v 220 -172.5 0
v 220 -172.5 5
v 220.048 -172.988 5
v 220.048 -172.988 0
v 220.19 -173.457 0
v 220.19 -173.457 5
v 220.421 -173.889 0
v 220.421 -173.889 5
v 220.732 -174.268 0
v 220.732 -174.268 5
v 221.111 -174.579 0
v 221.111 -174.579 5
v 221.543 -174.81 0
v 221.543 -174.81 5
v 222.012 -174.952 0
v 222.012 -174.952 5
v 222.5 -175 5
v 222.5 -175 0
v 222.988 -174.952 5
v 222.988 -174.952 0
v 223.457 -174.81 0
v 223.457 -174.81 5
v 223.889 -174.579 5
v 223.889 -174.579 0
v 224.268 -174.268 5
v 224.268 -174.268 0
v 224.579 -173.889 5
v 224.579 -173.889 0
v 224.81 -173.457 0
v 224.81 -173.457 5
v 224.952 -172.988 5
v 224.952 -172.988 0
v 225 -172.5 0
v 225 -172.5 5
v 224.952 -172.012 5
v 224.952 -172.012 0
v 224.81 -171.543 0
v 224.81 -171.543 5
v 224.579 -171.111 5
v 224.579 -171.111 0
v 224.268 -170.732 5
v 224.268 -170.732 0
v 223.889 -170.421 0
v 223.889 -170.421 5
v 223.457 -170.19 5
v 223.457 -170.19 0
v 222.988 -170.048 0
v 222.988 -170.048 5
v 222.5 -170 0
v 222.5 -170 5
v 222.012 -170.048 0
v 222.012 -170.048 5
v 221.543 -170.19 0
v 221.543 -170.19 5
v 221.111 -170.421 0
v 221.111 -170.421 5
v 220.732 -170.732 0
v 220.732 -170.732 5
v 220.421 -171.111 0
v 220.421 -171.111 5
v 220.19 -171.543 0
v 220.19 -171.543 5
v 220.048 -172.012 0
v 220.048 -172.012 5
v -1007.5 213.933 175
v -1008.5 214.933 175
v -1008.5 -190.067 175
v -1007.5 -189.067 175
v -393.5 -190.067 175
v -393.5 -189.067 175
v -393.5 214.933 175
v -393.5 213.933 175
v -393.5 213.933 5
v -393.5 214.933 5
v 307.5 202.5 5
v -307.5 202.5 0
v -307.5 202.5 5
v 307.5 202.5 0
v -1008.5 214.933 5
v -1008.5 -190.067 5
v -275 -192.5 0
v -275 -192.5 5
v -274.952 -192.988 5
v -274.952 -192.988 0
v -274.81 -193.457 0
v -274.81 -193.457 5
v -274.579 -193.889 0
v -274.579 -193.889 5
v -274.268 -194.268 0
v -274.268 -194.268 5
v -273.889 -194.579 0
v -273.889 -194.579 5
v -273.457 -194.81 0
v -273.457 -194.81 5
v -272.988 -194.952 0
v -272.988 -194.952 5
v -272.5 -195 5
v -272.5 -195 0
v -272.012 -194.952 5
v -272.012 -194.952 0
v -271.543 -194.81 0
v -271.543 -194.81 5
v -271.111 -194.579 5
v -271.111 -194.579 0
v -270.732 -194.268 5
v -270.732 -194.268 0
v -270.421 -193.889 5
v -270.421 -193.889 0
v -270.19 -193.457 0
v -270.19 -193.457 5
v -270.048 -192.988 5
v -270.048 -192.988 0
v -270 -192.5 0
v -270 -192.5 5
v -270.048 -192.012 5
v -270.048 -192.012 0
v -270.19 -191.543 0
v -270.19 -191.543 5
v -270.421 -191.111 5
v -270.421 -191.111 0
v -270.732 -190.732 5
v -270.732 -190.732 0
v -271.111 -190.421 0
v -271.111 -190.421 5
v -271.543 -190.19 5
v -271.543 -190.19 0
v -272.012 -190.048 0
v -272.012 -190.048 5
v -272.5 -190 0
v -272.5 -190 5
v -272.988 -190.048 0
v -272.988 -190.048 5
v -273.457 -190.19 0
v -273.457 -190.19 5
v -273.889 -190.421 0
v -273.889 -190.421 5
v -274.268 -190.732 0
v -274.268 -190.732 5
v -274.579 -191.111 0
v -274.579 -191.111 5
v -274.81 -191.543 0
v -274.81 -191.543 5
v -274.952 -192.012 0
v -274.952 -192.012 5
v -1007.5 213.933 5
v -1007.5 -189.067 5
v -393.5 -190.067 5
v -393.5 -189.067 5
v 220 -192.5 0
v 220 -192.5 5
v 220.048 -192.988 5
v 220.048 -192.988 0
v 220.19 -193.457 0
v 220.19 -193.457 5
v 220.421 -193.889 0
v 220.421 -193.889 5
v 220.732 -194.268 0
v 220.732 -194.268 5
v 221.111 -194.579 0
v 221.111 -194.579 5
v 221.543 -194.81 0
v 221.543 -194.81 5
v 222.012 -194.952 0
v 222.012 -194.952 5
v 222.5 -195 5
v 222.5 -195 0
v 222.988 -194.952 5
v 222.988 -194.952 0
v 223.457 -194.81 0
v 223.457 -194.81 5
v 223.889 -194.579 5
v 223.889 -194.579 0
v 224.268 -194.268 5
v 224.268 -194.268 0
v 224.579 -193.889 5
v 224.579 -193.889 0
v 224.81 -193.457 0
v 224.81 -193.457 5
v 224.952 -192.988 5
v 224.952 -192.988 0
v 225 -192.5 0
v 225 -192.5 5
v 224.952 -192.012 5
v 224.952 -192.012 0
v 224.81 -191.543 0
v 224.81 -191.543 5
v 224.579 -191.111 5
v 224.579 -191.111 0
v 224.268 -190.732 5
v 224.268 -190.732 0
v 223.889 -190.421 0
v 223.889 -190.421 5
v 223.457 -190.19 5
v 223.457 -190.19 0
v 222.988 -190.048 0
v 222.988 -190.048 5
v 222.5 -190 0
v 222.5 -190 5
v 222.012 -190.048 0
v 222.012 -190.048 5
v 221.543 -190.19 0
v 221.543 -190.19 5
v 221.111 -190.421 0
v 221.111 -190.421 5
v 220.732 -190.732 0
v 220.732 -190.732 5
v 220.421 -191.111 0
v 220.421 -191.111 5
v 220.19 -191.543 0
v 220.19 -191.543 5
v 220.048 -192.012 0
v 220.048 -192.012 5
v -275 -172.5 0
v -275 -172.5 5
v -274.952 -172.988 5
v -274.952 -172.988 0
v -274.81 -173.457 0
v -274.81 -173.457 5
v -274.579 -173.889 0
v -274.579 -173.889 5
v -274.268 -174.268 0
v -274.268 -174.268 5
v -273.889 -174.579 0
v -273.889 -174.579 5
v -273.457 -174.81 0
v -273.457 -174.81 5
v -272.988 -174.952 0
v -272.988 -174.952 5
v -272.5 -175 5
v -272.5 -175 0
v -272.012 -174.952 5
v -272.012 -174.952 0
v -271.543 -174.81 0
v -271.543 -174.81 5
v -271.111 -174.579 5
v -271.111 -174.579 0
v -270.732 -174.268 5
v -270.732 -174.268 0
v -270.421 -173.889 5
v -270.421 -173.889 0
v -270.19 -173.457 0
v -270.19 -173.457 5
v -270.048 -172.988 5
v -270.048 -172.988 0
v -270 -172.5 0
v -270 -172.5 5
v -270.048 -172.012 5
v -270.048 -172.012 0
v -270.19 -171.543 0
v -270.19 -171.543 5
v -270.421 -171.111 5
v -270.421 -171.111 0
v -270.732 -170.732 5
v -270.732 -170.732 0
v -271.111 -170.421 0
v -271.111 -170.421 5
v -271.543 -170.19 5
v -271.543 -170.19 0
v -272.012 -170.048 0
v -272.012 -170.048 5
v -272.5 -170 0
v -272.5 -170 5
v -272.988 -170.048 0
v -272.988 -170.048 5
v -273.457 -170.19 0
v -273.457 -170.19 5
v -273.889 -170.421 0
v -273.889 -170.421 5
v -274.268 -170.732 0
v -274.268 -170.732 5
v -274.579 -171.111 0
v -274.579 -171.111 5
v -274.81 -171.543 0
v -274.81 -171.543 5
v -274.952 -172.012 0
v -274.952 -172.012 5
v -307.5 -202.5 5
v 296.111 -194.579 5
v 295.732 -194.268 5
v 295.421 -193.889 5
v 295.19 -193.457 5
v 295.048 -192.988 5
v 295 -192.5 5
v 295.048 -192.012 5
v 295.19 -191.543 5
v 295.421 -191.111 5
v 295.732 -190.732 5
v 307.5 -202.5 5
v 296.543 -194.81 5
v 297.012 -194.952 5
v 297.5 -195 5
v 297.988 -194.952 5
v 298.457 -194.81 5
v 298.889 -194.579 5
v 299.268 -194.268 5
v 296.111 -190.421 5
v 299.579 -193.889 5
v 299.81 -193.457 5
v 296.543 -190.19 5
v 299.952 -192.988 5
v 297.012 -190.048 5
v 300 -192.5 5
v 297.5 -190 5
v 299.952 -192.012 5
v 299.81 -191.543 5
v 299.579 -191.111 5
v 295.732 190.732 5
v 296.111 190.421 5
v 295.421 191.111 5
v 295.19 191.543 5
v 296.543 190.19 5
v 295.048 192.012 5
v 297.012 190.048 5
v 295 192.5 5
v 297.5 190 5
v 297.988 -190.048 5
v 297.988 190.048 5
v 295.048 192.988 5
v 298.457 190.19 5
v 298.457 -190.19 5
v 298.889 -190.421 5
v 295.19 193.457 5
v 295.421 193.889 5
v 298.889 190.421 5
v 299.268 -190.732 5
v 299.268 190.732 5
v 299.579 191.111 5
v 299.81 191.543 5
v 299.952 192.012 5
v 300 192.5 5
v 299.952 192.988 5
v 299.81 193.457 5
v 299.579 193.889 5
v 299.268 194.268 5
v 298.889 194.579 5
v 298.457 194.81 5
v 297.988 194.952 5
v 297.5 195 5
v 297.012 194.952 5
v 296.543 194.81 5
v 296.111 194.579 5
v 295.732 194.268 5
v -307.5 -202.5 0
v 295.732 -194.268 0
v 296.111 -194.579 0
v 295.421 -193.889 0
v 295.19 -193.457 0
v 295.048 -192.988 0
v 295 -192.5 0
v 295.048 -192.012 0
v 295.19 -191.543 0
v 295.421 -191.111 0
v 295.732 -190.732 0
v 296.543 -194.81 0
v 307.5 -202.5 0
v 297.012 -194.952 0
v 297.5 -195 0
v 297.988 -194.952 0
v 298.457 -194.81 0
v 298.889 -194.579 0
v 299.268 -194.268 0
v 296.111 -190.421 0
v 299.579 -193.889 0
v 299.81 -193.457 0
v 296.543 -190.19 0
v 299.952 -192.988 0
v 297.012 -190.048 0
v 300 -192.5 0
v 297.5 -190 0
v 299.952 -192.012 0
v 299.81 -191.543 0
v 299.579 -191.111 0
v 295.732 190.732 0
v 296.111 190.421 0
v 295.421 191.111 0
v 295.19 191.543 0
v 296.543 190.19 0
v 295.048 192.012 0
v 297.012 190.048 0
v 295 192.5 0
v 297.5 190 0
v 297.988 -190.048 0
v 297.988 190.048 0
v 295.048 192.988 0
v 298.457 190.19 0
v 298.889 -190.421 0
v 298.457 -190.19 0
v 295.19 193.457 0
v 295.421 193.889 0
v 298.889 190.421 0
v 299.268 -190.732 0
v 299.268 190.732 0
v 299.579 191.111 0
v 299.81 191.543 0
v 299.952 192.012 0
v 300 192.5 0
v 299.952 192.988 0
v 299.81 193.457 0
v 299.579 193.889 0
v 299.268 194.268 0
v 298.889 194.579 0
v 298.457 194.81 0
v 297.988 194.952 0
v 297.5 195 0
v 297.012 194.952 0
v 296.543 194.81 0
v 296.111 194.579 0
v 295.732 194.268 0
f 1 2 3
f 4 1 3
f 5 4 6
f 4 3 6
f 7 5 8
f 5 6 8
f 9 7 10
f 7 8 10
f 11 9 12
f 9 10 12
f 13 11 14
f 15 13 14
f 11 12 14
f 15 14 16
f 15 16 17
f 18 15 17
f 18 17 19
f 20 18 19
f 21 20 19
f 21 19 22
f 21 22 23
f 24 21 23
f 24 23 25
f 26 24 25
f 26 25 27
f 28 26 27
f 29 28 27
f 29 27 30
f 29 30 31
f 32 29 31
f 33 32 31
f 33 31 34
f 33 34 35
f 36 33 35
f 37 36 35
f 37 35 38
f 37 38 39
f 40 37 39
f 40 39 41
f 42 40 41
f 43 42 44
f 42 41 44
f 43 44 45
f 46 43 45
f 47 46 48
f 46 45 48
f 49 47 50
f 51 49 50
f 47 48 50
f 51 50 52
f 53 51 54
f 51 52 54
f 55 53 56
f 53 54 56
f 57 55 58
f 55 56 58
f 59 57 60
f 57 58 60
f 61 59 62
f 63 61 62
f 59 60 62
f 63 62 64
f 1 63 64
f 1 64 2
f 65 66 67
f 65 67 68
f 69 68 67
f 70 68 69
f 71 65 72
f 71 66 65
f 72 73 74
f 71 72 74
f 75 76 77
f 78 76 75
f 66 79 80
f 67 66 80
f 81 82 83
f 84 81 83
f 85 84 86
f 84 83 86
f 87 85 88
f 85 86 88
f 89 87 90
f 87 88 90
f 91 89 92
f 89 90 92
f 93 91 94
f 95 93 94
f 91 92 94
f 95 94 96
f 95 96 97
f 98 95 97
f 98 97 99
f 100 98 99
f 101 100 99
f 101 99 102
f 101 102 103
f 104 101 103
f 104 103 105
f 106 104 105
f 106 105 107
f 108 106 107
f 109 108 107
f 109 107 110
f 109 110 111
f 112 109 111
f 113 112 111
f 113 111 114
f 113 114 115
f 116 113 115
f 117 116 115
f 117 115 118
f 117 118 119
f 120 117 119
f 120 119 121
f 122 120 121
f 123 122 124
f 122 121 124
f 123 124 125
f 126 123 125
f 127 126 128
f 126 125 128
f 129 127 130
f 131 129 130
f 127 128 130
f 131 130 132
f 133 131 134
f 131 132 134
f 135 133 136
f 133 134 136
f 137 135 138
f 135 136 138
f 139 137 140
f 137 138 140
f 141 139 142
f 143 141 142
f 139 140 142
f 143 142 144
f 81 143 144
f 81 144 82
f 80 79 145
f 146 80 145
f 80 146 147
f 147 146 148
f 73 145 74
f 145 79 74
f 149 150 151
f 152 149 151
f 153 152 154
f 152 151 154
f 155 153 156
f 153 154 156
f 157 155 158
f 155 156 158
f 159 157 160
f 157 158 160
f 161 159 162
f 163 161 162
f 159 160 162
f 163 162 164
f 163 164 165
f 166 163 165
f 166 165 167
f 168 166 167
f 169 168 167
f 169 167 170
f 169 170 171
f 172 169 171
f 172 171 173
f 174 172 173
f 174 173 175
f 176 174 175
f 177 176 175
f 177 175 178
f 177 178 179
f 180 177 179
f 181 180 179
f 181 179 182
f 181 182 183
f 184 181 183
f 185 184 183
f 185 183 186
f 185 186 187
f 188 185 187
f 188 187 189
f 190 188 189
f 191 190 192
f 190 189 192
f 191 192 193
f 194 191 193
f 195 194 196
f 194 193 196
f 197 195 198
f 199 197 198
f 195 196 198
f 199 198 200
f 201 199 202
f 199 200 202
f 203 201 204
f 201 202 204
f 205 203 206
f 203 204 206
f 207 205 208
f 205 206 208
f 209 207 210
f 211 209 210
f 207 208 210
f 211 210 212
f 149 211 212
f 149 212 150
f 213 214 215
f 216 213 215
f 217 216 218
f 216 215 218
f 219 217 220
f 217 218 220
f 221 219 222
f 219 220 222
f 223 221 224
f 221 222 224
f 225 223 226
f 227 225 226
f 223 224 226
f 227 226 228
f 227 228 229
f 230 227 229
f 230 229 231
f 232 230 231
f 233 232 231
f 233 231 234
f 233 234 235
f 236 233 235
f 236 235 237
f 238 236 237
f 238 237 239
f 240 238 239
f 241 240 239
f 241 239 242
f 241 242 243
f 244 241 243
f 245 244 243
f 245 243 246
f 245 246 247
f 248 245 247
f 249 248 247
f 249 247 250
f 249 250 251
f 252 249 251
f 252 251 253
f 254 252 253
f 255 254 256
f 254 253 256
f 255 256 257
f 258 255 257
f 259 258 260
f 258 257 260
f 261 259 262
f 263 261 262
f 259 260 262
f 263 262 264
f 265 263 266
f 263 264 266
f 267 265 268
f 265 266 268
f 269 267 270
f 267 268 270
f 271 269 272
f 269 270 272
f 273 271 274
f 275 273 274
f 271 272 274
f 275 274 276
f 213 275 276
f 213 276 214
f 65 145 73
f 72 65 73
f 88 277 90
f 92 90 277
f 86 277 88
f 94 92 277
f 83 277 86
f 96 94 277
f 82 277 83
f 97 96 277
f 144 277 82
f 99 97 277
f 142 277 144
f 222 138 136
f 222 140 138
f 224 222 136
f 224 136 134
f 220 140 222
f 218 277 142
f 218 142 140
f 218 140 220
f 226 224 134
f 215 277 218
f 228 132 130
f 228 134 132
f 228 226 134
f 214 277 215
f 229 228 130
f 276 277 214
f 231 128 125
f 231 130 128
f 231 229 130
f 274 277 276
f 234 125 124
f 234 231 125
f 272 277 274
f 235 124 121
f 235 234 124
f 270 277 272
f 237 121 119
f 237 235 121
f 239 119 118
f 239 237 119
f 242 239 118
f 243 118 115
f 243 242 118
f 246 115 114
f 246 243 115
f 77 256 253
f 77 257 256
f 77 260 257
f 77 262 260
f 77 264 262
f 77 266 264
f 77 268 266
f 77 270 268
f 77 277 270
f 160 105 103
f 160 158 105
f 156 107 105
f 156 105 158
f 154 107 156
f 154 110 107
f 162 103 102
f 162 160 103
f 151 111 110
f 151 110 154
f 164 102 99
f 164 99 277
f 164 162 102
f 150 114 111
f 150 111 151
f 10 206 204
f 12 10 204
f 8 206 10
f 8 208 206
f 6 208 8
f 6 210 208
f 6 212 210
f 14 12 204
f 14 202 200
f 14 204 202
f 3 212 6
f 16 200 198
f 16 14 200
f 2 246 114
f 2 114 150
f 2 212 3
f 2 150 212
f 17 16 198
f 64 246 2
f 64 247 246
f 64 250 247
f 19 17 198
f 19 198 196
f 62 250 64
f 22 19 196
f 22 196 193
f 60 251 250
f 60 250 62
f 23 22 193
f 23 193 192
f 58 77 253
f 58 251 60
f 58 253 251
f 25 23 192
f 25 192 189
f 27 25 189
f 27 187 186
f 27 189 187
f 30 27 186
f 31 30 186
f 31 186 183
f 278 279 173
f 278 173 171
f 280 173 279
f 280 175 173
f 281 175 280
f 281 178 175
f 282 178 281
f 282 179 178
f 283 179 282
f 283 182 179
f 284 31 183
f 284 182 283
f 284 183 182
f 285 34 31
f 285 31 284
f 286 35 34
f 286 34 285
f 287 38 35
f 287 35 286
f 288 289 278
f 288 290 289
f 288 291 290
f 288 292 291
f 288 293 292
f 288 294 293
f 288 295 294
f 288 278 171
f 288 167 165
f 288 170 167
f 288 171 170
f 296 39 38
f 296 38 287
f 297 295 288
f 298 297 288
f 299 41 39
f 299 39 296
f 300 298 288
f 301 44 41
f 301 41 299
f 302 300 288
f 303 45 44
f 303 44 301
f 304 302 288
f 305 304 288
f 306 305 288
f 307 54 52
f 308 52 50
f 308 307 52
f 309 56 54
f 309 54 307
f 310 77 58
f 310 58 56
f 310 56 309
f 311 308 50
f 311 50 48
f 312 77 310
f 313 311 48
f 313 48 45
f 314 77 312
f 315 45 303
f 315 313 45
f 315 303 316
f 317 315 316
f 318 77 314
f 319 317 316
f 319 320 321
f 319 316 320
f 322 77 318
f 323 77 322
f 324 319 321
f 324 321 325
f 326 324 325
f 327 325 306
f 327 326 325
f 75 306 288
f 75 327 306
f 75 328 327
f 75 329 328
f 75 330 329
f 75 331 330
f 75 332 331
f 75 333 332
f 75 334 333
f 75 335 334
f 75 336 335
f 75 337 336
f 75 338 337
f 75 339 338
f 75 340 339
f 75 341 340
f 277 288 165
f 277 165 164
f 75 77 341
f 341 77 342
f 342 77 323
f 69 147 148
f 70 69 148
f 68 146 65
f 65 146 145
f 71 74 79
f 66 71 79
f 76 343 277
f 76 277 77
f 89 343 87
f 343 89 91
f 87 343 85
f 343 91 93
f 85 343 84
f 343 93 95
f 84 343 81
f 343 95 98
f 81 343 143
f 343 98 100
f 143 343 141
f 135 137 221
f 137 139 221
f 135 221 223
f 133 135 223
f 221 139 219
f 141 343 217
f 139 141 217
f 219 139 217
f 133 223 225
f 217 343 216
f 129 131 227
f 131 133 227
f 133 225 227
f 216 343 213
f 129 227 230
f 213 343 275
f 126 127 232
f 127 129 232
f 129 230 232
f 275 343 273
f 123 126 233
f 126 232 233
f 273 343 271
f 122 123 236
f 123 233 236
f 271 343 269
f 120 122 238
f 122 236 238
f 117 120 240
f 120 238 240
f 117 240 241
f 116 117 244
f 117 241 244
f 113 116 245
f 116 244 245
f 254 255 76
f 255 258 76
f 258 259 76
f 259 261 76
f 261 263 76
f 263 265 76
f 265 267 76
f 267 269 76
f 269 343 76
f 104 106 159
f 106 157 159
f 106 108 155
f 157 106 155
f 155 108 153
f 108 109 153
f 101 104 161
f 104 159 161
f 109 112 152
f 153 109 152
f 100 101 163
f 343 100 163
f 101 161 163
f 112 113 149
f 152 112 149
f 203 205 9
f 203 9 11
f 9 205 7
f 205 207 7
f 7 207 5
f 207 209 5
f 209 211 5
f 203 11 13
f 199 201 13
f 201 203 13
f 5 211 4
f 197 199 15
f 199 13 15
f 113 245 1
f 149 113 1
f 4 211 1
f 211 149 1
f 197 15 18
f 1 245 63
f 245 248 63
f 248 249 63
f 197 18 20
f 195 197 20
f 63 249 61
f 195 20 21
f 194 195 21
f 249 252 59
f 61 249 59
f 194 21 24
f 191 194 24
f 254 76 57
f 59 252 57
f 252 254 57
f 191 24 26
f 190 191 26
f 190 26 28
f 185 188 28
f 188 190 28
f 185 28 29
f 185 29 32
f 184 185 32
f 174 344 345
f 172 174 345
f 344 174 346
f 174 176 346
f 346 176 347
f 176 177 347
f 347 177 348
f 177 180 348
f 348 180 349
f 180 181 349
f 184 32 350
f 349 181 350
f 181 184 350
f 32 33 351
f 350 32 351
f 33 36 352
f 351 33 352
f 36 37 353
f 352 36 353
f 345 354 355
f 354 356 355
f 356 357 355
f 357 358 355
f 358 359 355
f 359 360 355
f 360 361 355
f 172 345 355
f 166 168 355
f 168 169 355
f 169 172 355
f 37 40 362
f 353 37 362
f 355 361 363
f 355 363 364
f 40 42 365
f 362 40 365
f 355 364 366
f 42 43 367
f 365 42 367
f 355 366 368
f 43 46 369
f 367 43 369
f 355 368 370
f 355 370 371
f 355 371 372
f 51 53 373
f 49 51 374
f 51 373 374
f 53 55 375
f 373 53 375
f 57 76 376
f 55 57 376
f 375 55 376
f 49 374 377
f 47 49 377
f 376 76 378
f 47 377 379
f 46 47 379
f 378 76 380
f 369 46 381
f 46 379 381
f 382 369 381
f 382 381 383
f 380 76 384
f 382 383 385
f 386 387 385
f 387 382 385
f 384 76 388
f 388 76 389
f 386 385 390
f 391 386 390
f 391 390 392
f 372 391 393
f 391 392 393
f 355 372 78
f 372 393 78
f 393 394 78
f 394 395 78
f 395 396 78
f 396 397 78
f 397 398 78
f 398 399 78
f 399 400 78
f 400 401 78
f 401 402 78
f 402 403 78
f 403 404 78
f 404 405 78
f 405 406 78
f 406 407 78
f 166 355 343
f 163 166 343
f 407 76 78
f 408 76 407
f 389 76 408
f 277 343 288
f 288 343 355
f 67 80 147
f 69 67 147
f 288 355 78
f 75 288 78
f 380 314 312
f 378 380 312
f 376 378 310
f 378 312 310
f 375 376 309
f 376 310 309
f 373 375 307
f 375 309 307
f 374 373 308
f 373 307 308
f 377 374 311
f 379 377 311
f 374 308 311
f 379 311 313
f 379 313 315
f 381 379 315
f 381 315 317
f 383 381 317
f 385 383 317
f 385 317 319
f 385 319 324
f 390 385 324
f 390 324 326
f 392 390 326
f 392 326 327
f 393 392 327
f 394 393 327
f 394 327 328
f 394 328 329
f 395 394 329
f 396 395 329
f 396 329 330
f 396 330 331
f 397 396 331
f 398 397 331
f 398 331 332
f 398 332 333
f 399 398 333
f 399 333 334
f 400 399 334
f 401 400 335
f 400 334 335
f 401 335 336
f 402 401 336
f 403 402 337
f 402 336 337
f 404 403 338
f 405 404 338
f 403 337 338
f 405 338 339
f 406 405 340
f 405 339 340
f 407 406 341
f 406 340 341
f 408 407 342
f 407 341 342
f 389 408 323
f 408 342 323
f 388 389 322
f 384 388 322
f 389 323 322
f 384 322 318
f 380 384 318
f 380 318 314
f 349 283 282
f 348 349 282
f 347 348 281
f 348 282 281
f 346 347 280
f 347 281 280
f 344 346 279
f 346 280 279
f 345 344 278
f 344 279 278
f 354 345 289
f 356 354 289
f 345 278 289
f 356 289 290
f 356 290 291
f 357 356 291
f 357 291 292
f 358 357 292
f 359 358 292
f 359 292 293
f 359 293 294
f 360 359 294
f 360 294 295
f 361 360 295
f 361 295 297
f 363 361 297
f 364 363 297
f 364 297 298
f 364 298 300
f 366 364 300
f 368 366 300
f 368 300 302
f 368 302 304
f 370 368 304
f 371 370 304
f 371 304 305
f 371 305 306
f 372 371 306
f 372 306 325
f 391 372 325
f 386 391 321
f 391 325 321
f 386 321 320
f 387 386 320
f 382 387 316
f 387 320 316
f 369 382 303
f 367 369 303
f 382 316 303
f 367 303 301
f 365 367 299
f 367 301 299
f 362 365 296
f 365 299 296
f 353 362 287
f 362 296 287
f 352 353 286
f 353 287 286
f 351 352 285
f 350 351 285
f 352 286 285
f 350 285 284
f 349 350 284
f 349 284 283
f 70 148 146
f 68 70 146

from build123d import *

# Parameters (mm, degrees)
F0_W     = 615
F0_H     = 405
F1_DEPTH = 5
F4_DEPTH = 170
F6_D     = 5
F8_D     = 5
F10_D    = 5
F12_D    = 5
F14_D    = 5
F16_D    = 5


with BuildPart() as f1:
    # F0 (on Top) → F1 (new body)
    with BuildSketch(Plane.XY):
        Rectangle(F0_W, F0_H)
    extrude(amount=F1_DEPTH)

    # F6 (through all)
    with Locations(Plane(origin=(0, 0, 0), x_dir=(1, 0, 0), z_dir=(0, 0, -1))):
        with Locations((-272.5, 192.5)):
            Hole(F6_D / 2)

    # F8 (through all)
    with Locations(Plane(origin=(0, 0, 0), x_dir=(1, 0, 0), z_dir=(0, 0, -1))):
        with Locations((-272.5, 172.5)):
            Hole(F8_D / 2)

    # F10 (through all)
    with Locations(Plane(origin=(0, 0, 0), x_dir=(1, 0, 0), z_dir=(0, 0, -1))):
        with Locations((222.5, 192.5)):
            Hole(F10_D / 2)

    # F12 (through all)
    with Locations(Plane(origin=(0, 0, 0), x_dir=(1, 0, 0), z_dir=(0, 0, -1))):
        with Locations((222.5, 172.5)):
            Hole(F12_D / 2)

    # F14 (through all)
    with Locations(Plane(origin=(0, 0, 0), x_dir=(1, 0, 0), z_dir=(0, 0, -1))):
        with Locations((297.5, -192.5)):
            Hole(F14_D / 2)

    # F16 (through all)
    with Locations(Plane(origin=(0, 0, 0), x_dir=(1, 0, 0), z_dir=(0, 0, -1))):
        with Locations((297.5, 192.5)):
            Hole(F16_D / 2)


with BuildPart() as f4:
    # F3 (on face) → F4 (new body)
    with BuildSketch(Plane.XY.offset(5)):
        Polygon((-1008.5, -190.067157), (-393.5, -190.067157), (-393.5, -189.067157), (-1007.5, -189.067157), (-1007.5, 213.932843), (-393.5, 213.932843), (-393.5, 214.932843), (-1008.5, 214.932843), align=None)
    extrude(amount=F4_DEPTH)


solid = Compound([f1.part, f4.part])
